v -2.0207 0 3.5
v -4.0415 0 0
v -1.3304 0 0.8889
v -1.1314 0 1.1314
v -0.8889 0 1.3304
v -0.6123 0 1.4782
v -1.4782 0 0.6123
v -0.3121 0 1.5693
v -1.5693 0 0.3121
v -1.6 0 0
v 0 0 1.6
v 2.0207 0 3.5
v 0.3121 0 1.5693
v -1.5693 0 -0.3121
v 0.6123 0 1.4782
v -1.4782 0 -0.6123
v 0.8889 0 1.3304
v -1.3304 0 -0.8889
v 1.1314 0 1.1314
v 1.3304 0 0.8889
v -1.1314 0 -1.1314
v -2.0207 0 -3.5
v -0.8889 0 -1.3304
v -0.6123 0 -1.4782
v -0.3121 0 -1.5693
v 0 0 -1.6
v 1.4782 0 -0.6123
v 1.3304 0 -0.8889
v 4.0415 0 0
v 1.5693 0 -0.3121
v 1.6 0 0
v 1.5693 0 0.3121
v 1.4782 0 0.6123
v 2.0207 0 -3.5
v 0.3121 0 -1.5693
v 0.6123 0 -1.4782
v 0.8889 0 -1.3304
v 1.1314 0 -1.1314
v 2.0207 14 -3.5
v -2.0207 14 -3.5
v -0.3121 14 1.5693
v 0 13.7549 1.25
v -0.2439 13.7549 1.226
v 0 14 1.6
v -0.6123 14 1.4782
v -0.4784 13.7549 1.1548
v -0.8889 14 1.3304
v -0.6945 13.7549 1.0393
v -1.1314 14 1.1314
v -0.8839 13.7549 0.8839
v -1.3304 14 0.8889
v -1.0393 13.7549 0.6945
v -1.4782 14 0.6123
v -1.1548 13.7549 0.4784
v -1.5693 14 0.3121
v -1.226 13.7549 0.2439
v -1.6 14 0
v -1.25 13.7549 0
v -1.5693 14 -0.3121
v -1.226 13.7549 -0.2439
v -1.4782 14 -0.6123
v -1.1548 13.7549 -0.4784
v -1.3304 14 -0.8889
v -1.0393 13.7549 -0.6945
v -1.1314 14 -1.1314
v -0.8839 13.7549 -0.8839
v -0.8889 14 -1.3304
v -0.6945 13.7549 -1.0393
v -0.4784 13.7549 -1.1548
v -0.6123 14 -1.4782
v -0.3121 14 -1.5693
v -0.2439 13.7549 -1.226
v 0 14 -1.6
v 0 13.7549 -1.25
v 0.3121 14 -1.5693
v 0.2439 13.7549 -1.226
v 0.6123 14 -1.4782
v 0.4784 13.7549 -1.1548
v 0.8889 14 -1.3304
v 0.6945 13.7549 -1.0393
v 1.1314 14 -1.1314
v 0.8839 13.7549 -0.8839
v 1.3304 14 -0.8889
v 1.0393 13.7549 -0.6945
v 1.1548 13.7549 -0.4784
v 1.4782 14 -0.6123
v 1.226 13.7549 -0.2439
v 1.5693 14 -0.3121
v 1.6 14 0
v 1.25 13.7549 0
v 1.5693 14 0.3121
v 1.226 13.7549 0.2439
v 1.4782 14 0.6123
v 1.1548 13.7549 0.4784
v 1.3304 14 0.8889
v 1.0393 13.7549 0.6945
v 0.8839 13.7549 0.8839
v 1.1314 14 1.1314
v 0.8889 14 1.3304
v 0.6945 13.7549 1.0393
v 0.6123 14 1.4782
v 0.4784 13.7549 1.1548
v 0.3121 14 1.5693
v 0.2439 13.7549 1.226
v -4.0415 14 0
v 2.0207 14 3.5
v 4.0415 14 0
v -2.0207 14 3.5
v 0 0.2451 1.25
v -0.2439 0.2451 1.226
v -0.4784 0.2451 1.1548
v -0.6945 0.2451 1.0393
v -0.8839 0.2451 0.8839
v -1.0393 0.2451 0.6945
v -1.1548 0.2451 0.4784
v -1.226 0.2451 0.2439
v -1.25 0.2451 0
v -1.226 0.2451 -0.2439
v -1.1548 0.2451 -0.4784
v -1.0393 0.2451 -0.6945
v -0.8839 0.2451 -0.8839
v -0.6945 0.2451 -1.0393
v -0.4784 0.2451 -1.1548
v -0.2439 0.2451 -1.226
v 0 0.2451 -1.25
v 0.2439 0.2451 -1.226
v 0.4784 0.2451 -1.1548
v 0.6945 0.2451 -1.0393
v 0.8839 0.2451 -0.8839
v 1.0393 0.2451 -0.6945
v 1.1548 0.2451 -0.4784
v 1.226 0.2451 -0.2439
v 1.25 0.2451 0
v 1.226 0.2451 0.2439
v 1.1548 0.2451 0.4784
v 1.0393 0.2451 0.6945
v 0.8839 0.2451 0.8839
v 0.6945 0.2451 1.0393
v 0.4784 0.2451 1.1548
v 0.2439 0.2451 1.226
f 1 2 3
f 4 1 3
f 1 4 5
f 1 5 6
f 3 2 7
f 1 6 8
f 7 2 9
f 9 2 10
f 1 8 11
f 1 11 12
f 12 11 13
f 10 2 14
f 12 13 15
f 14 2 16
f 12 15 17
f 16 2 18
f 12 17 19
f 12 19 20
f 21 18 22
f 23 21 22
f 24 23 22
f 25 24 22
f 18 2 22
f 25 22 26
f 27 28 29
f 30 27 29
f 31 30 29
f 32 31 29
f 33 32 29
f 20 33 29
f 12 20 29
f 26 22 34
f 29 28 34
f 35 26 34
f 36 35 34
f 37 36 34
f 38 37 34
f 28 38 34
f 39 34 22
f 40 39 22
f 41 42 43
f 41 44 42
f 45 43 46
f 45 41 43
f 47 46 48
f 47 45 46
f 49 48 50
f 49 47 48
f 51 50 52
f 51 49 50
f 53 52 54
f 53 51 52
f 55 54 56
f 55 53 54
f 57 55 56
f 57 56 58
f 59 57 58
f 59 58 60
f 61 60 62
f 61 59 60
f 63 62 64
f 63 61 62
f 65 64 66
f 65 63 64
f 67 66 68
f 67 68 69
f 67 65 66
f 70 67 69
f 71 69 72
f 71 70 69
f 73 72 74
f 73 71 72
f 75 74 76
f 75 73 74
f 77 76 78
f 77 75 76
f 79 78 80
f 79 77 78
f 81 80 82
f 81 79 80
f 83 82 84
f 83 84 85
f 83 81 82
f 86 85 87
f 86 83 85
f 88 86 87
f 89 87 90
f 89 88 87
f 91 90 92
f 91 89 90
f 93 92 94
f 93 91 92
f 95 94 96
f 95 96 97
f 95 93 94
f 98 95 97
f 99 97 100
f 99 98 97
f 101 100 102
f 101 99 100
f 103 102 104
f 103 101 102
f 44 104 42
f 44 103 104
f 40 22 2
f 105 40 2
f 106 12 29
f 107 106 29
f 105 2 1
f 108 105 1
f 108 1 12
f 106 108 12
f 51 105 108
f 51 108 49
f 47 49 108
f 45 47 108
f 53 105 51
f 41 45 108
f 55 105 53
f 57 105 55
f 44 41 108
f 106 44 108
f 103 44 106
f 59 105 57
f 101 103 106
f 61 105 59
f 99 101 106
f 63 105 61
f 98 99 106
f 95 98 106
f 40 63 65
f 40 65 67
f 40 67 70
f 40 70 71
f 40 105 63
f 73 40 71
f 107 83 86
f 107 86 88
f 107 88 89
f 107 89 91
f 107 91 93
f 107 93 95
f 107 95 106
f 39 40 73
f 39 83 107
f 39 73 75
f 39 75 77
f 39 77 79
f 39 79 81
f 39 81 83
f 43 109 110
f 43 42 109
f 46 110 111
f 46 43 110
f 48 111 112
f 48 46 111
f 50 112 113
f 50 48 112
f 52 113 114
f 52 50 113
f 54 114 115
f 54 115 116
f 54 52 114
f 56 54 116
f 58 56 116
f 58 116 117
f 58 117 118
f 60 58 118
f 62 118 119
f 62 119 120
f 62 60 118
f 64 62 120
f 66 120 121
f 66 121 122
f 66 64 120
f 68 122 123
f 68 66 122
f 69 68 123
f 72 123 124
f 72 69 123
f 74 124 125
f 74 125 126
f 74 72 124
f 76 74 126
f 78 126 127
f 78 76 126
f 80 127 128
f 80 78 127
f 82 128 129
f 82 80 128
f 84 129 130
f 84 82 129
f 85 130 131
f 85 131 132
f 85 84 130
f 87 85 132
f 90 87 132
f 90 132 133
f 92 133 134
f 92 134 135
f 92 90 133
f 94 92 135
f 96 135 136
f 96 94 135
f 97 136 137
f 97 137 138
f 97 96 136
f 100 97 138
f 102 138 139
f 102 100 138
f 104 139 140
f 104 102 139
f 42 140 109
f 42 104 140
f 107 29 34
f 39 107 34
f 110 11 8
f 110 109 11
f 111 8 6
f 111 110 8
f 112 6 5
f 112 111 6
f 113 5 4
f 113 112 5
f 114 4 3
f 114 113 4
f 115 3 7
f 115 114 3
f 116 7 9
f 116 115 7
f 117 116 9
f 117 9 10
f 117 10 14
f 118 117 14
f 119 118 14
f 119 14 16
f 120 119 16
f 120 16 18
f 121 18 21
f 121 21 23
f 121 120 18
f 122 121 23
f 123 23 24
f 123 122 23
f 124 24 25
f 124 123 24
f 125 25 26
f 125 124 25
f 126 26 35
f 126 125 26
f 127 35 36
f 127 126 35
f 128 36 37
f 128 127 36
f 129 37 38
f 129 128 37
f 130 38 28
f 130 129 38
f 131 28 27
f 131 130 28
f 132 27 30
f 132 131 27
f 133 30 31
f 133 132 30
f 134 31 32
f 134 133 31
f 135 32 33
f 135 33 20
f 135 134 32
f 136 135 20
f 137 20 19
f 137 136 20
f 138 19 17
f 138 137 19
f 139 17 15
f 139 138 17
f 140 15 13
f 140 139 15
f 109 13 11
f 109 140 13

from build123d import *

# Parameters (mm, degrees)
EXTRUDE_1_DEPTH = 14


with BuildPart() as part:
    # Эскиз1 → Бобышка-Вытянуть1 (new body)
    with BuildSketch(Plane(origin=(0, 0, 0), x_dir=(1, 0, 0), z_dir=(0, 1, 0))):
        Polygon((4.041451884, 0), (2.020725942, 3.5), (-2.020725942, 3.5), (-4.041451884, 0), (-2.020725942, -3.5), (2.020725942, -3.5), align=None)
    extrude(amount=EXTRUDE_1_DEPTH)

    # Эскиз2 → Отверстие обработанное метчиком M3x0.51 (revolve, cut)
    with BuildSketch(Plane(origin=(0, 14, 0), x_dir=(0, 0, 1), z_dir=(1, 0, 0))):
        Polygon((0, 0), (0, 14), (1.6, 14), (1.25, 13.754927362), (1.25, 0.245072638), (1.6, 0), align=None)
    revolve(axis=Axis((0, 20.35, 0), (0, -1, 0)), mode=Mode.SUBTRACT)


solid = part.part
